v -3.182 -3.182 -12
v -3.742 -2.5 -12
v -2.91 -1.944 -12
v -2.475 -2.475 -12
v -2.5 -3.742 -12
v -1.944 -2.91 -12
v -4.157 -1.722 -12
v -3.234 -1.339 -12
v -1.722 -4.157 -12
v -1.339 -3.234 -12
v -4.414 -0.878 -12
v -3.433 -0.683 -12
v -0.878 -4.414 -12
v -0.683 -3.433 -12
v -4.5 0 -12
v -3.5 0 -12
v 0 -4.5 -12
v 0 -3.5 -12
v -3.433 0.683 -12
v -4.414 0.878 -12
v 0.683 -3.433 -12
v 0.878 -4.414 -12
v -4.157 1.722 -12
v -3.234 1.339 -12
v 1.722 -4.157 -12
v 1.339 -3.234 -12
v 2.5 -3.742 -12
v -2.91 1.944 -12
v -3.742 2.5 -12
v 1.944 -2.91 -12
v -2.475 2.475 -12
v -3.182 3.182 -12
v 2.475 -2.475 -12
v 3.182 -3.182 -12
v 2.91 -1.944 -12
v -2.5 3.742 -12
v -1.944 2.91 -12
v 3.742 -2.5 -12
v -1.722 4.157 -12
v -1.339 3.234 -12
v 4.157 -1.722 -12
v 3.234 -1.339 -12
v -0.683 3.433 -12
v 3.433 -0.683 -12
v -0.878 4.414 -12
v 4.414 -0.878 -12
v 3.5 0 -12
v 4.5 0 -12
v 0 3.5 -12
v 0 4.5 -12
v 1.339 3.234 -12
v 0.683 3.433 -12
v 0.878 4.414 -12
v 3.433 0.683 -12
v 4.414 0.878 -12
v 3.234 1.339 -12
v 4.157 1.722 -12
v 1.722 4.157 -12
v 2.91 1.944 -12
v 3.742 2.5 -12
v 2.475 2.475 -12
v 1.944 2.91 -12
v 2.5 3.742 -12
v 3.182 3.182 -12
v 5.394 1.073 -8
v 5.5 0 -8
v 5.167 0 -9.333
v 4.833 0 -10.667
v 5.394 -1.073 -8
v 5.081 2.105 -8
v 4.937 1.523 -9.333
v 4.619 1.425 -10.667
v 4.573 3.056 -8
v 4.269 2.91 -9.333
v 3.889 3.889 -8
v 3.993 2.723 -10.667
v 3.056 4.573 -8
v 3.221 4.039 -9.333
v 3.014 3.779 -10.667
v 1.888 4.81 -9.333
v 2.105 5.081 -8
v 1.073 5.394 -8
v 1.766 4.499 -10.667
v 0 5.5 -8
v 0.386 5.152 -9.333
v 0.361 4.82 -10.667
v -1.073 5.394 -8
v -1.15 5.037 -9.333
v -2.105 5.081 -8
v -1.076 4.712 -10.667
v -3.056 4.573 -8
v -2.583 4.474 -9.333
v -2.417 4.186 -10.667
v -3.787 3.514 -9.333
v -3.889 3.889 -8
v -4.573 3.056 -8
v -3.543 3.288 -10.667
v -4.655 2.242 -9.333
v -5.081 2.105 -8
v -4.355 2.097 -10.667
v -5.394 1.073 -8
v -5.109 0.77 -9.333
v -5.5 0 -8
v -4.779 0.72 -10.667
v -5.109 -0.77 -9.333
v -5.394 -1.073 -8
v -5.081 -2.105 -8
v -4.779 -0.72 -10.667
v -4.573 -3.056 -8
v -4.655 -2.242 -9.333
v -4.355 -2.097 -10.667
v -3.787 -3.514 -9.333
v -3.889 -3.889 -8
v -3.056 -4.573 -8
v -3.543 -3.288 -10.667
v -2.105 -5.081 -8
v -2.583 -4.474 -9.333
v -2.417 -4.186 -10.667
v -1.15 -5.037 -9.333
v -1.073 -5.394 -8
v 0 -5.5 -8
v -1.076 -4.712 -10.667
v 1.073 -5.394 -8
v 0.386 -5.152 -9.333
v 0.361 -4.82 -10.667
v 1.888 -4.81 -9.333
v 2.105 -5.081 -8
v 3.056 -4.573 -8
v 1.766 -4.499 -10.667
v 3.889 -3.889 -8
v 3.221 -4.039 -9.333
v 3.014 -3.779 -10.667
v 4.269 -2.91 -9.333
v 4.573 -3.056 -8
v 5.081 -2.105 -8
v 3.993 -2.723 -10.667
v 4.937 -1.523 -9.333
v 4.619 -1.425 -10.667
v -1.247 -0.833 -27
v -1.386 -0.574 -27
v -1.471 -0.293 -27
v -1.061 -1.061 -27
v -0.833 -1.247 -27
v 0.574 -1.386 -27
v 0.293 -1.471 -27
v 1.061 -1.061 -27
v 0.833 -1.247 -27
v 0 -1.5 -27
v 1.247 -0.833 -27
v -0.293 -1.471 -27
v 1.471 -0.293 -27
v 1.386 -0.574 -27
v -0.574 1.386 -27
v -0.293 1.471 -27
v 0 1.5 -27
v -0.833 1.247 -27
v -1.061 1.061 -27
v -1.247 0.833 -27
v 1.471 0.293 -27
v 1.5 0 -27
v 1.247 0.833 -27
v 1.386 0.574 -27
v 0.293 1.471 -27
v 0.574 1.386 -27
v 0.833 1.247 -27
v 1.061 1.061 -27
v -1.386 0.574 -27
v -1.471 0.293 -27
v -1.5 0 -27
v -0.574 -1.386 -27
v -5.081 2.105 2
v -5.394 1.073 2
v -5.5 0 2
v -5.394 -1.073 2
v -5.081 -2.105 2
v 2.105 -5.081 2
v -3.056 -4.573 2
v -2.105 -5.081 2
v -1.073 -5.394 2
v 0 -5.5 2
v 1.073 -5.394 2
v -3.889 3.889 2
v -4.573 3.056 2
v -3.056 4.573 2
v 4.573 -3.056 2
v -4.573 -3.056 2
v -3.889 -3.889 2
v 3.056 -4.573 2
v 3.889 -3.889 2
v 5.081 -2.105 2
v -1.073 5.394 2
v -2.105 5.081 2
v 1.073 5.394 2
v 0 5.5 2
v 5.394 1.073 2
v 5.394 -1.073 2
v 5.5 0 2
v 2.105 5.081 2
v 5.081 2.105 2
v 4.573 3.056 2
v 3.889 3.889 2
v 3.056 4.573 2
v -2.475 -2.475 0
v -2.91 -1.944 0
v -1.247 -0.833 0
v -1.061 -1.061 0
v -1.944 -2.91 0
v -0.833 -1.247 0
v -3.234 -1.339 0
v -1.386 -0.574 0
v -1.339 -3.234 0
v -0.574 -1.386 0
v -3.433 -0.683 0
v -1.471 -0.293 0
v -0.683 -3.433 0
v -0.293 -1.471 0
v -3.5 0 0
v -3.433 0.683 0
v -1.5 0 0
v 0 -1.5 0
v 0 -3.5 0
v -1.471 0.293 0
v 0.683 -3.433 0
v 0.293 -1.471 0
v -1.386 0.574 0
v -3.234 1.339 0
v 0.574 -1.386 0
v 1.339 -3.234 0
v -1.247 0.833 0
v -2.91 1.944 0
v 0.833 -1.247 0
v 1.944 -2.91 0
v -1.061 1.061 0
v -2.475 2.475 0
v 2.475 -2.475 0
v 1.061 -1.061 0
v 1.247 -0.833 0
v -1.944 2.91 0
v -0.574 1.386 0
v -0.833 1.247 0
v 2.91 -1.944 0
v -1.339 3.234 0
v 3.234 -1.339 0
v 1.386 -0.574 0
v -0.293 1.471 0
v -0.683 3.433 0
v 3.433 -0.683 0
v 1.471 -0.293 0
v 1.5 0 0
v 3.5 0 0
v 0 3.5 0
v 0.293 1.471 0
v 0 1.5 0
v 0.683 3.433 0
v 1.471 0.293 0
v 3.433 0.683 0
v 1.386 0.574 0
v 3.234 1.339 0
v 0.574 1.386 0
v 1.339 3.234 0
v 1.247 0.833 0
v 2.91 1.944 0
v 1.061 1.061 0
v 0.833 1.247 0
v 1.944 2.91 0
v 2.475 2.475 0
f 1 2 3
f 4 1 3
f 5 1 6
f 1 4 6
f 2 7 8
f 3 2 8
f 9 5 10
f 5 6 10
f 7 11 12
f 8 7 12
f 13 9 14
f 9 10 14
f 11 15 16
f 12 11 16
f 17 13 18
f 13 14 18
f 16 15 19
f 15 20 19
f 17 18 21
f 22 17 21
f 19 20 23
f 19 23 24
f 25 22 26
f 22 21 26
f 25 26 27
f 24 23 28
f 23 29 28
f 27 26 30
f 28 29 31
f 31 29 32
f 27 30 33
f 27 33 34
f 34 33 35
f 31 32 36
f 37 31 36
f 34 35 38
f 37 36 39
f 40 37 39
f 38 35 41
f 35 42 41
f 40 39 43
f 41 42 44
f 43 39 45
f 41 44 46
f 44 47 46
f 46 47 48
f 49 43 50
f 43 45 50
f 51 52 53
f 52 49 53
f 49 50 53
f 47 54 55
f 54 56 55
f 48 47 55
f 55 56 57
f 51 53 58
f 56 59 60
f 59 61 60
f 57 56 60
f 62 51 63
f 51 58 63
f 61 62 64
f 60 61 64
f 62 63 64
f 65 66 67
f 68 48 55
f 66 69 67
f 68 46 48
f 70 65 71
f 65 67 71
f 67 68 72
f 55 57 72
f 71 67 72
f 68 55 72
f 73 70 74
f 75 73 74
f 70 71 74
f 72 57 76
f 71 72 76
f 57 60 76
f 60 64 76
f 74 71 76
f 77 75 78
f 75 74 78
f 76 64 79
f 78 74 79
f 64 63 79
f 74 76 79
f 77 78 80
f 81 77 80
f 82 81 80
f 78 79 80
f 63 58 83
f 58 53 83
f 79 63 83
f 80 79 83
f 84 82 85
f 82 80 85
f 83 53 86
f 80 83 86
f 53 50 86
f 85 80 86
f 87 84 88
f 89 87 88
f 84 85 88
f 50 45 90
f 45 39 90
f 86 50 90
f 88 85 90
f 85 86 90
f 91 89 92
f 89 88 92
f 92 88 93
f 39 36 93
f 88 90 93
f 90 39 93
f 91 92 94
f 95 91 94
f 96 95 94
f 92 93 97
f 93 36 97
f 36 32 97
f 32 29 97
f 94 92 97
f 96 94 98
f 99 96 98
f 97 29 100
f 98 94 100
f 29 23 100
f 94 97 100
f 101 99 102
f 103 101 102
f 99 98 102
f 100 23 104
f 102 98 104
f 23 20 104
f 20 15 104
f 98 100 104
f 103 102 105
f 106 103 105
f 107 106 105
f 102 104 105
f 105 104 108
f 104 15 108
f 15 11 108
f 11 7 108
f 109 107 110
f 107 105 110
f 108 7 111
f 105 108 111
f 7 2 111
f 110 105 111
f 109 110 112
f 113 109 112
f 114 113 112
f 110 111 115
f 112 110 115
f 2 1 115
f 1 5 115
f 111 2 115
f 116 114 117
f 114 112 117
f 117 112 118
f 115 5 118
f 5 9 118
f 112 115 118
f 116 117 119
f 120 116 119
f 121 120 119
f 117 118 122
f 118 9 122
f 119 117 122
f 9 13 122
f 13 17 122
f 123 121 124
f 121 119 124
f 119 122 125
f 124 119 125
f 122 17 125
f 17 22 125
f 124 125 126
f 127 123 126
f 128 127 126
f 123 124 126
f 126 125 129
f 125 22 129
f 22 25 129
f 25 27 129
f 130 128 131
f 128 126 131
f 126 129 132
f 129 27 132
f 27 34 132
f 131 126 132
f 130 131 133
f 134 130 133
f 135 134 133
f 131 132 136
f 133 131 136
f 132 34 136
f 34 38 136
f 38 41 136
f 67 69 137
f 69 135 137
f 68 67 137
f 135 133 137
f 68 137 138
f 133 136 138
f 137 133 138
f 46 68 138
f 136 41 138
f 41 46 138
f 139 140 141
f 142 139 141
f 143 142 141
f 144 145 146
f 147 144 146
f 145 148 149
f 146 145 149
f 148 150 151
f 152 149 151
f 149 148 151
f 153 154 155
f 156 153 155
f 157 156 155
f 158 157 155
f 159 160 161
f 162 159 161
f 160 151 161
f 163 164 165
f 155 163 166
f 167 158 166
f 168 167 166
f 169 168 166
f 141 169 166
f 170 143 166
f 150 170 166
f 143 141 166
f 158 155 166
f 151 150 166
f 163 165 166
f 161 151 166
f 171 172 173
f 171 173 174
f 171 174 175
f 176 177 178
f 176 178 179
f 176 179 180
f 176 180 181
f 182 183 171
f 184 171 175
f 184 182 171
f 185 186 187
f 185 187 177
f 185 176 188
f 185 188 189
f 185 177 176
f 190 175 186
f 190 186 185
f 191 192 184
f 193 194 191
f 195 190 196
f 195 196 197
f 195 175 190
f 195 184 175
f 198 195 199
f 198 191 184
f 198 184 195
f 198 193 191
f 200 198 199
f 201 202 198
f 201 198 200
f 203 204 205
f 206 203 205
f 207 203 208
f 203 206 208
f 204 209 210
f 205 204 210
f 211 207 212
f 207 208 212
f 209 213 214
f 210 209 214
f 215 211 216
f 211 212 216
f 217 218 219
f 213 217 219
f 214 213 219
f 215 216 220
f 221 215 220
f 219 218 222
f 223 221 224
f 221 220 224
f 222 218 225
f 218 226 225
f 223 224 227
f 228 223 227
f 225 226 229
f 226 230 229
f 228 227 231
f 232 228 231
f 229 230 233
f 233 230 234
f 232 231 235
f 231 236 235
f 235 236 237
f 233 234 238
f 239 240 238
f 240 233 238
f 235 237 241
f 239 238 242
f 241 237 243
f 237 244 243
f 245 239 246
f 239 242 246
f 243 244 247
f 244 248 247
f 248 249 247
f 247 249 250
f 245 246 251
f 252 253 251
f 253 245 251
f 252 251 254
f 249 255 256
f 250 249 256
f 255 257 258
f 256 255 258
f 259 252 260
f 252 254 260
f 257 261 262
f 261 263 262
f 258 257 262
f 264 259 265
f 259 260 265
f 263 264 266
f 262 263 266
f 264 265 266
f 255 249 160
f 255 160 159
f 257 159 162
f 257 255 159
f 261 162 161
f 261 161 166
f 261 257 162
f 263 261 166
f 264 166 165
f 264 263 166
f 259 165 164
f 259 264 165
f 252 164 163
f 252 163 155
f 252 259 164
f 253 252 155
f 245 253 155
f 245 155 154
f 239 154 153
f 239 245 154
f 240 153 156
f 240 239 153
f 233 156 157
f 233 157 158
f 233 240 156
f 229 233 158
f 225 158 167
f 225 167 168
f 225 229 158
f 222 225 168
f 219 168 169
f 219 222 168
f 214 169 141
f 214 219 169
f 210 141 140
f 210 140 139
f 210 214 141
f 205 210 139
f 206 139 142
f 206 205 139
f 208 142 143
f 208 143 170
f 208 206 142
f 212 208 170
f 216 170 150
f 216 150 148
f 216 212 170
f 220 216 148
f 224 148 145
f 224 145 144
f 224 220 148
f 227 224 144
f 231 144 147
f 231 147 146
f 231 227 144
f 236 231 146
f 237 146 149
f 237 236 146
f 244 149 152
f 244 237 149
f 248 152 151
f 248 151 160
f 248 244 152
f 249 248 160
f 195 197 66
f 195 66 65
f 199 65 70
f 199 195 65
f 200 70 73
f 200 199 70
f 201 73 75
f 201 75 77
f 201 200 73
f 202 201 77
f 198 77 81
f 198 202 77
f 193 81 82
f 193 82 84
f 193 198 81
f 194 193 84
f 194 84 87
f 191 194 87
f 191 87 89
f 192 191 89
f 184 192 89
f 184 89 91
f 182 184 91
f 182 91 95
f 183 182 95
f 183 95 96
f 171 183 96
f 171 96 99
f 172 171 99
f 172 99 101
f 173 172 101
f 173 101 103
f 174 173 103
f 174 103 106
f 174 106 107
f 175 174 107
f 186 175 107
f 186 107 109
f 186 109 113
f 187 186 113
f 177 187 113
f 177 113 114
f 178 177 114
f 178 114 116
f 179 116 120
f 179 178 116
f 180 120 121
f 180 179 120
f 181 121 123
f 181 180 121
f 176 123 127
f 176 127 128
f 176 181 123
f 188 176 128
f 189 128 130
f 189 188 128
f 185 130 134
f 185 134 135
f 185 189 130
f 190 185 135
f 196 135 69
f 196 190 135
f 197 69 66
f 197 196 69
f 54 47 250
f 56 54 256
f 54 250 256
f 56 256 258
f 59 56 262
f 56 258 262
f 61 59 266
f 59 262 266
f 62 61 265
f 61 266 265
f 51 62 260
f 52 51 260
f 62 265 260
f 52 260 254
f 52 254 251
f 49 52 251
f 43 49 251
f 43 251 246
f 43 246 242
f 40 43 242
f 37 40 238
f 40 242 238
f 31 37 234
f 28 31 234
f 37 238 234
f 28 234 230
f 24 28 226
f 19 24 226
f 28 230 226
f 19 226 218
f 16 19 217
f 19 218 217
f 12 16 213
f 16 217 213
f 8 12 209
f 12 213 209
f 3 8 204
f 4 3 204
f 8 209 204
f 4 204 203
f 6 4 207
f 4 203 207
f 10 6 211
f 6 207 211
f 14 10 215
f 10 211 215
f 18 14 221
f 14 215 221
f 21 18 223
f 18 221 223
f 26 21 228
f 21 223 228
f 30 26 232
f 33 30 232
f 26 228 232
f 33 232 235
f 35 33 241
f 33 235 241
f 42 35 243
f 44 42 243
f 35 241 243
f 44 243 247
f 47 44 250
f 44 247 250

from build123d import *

# Parameters (mm, degrees)
F0_R     = 5.5
F0_R_2   = 3.5
F0_R_3   = 1.5
F1_DEPTH = 2
F2_DEPTH = 27
F3_DEPTH = 12
F4_SIZE2 = 1
F4_SIZE  = 4


with BuildPart() as f1:
    # F0 (on Top) → F1 (new body)
    with BuildSketch(Plane.XY):
        Circle(F0_R)
        Circle(F0_R_2, mode=Mode.SUBTRACT)
        Circle(F0_R_2)
        Circle(F0_R_3, mode=Mode.SUBTRACT)
        Circle(F0_R_3)
    extrude(amount=F1_DEPTH)

    # F0 (on Top) → F2 (join)
    with BuildSketch(Plane.XY):
        Circle(F0_R_3)
    extrude(amount=-F2_DEPTH)

    # F0 (on Top) → F3 (join)
    with BuildSketch(Plane.XY):
        Circle(F0_R)
        Circle(F0_R_2, mode=Mode.SUBTRACT)
    extrude(amount=-F3_DEPTH)

    # F4
    f4_edges = [f1.edges().sort_by_distance(p)[0] for p in [
        (-5.5, 0, -12),
    ]]
    f4_side = f1.faces().sort_by_distance((-5.5, 0, -6))[0]
    chamfer(f4_edges, length=F4_SIZE, length2=F4_SIZE2, reference=f4_side)


solid = f1.part
